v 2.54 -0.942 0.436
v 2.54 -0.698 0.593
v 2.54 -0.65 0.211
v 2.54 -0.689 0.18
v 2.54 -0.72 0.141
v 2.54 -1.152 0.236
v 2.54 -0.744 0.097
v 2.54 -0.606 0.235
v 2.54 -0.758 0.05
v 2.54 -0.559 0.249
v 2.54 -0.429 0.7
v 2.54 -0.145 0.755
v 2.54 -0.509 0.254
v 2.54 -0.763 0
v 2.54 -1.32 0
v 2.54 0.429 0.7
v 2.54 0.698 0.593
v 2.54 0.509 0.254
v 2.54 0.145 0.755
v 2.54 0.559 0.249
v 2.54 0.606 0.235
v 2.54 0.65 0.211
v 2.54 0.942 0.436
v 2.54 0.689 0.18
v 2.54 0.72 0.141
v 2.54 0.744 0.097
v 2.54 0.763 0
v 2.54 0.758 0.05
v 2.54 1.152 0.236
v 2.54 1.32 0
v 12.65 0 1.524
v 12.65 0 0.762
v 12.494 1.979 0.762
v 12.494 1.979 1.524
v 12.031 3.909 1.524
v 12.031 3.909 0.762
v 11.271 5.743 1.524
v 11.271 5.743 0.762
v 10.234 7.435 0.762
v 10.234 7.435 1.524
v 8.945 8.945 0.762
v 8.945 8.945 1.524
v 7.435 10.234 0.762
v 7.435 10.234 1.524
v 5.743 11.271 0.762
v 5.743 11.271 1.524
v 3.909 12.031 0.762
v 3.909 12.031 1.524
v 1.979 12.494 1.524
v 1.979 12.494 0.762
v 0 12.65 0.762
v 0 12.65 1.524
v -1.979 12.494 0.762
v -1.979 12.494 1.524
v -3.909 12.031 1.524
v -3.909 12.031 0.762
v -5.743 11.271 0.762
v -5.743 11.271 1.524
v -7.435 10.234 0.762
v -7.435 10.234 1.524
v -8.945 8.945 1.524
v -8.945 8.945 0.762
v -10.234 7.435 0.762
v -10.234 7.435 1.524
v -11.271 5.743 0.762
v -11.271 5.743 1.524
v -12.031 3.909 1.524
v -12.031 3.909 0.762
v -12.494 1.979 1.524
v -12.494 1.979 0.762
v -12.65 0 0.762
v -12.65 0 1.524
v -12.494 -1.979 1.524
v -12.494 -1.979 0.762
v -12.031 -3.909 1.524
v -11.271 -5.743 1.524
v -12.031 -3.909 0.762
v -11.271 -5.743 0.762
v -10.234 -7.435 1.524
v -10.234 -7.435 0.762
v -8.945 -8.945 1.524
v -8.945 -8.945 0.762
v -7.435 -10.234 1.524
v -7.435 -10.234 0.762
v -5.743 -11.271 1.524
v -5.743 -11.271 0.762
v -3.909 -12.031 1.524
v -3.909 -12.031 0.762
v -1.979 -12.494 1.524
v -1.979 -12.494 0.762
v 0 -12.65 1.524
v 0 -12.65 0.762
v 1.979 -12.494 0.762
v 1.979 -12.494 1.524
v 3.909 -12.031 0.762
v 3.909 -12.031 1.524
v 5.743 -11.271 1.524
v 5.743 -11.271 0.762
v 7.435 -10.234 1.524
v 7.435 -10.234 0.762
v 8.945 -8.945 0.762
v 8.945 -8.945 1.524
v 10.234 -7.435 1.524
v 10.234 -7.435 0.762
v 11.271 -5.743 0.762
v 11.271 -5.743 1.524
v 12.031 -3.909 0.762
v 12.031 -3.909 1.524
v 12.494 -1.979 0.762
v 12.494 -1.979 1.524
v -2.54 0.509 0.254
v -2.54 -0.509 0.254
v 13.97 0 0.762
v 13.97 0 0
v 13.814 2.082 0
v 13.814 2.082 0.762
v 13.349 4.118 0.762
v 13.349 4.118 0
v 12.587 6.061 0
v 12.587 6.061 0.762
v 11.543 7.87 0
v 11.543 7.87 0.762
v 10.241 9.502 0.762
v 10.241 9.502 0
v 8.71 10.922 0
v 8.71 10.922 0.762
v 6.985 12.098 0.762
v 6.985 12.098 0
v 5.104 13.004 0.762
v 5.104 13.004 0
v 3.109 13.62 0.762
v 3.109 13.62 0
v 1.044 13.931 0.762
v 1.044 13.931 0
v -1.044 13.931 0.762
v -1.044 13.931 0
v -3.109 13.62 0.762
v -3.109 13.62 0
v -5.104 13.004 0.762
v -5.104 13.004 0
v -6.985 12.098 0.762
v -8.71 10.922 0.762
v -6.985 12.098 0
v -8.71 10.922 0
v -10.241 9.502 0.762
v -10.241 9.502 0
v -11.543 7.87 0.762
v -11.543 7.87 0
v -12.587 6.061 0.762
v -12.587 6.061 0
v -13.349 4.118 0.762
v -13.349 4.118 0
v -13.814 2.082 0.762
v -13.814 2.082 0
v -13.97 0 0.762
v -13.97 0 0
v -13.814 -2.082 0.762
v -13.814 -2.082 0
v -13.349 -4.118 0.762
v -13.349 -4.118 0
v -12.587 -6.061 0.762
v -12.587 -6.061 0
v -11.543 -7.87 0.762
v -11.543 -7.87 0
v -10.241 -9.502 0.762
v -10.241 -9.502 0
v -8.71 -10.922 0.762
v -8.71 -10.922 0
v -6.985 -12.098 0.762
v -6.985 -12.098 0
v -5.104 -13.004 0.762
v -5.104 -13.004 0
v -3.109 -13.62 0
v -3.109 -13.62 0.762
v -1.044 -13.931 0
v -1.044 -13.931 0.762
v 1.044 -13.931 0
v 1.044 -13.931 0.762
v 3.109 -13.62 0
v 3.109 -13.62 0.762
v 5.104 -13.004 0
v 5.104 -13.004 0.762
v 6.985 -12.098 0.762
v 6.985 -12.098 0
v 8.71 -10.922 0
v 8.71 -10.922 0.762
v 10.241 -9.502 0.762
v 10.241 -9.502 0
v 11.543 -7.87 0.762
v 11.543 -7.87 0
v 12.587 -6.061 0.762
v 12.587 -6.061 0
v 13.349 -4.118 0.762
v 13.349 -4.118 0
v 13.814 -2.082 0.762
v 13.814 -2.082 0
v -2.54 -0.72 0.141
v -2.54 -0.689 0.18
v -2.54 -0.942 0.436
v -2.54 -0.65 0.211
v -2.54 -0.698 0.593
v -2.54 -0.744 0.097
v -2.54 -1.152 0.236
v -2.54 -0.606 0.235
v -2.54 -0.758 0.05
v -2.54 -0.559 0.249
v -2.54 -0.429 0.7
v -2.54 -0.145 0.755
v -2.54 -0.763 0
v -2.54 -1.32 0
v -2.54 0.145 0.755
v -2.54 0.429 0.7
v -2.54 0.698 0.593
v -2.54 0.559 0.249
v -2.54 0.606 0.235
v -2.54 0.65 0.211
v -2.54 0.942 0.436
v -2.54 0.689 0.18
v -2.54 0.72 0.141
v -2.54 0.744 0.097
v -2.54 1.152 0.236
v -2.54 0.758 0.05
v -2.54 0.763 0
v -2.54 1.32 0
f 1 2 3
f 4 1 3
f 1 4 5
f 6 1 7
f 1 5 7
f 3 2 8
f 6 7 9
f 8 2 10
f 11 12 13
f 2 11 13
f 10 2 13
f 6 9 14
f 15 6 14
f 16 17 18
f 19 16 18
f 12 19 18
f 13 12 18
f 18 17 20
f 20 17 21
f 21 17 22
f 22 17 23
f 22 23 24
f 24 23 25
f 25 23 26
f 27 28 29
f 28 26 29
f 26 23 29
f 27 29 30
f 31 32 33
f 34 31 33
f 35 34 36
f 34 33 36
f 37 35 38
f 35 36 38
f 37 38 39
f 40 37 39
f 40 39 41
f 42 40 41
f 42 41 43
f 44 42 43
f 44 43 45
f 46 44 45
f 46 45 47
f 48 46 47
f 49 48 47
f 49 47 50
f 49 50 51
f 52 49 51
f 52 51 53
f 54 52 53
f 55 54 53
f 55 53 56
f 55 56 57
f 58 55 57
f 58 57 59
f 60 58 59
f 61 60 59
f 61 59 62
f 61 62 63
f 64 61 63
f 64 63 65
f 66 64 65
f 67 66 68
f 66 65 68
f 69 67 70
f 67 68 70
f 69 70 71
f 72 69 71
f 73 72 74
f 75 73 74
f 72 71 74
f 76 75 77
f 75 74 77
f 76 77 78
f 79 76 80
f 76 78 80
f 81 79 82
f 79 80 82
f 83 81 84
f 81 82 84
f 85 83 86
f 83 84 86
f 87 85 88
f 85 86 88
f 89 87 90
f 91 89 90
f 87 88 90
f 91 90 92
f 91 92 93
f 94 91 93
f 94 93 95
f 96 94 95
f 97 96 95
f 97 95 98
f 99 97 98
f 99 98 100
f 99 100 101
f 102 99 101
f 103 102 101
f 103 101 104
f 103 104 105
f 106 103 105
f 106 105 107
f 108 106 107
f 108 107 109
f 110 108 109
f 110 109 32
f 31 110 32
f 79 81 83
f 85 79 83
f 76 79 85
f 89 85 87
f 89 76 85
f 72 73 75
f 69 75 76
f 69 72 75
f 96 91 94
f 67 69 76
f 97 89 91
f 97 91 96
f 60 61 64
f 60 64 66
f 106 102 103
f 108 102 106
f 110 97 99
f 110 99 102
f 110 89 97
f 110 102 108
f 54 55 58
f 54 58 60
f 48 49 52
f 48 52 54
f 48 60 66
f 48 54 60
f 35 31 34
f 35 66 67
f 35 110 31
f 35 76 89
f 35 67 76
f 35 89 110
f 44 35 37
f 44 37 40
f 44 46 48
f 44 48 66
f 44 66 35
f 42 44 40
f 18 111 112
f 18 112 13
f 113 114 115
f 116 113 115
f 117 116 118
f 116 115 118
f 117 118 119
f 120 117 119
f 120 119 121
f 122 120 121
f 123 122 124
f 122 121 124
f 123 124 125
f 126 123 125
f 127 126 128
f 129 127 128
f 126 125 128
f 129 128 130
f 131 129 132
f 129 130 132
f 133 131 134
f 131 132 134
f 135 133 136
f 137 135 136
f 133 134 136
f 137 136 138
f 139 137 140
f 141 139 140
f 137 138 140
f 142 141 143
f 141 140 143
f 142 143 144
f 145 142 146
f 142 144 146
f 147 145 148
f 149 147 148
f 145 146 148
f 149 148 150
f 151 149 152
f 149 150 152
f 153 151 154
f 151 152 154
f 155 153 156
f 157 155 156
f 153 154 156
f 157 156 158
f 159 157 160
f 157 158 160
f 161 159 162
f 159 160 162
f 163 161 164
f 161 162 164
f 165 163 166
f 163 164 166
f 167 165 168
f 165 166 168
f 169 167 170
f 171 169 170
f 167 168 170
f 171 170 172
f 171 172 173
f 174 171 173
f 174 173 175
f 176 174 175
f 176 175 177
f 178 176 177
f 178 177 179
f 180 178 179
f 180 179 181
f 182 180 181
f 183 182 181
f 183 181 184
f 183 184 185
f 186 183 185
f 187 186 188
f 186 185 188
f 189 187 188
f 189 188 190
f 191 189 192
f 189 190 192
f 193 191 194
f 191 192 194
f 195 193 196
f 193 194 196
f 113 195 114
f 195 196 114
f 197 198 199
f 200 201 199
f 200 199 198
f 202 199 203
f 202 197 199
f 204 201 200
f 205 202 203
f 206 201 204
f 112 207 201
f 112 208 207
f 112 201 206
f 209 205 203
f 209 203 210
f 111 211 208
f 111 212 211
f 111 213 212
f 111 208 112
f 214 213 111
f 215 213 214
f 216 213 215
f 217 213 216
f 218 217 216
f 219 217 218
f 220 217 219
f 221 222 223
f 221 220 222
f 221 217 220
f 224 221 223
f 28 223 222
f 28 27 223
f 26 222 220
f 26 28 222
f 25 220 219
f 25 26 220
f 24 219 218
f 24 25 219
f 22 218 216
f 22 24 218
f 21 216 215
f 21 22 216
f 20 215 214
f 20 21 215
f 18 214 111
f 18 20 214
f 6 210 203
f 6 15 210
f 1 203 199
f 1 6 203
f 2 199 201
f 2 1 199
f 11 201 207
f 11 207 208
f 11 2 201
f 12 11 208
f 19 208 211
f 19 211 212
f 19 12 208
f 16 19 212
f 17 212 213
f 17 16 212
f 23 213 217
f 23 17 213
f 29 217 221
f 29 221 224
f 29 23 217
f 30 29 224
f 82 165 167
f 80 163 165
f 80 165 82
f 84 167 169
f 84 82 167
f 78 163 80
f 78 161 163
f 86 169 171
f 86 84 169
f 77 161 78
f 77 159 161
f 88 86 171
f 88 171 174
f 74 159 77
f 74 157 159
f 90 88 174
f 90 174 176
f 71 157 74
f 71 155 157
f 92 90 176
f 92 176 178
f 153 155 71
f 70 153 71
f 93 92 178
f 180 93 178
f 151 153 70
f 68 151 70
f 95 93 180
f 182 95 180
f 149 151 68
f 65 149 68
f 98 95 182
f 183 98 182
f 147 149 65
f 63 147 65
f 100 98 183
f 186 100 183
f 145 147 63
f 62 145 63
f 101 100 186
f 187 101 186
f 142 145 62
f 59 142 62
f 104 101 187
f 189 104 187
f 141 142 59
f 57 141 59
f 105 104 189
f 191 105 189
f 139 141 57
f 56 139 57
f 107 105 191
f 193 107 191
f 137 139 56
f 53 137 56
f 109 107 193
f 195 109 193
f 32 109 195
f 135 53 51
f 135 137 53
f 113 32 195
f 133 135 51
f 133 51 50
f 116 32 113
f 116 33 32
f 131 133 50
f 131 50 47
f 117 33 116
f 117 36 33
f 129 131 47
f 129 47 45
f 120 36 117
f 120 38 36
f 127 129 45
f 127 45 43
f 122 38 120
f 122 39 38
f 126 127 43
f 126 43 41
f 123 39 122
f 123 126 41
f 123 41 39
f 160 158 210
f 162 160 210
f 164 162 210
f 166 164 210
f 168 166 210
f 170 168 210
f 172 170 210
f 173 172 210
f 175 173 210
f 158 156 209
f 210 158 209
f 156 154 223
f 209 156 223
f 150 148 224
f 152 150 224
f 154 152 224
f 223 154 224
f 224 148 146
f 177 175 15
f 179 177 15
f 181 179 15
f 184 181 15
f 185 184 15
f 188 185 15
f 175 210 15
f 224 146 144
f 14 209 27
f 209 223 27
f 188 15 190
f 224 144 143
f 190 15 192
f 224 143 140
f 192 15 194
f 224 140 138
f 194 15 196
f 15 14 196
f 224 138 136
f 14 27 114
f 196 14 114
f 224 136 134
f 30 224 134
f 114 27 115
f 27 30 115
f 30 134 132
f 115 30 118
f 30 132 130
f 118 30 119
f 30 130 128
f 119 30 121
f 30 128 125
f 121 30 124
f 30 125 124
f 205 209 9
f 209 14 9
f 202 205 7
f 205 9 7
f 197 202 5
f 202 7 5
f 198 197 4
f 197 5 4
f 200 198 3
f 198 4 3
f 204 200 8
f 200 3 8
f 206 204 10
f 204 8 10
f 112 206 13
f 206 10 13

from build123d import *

# Parameters (mm, degrees)
F0_R     = 12.65
F1_DEPTH = 1.524
F2_R     = 13.97
F3_DEPTH = 0.762
F4_W     = 5.08
F4_H     = 1.524
F6_W     = 5.08000508
F6_H     = 1.5265774739
F7_DEPTH = 0.254
F8_R     = 0.25399


# Not quite as in the source:
# - a fillet or chamfer is up to 0.001 mm smaller than in the source, because OpenCascade refuses the exact size


with BuildPart() as f1:
    # F0 (on Top) → F1 (new body)
    with BuildSketch(Plane.XY):
        Circle(F0_R)
    extrude(amount=F1_DEPTH)

    # F2 (on Top) → F3 (join)
    with BuildSketch(Plane.XY):
        Circle(F2_R)
    extrude(amount=F3_DEPTH)

    # F4 (on Front) → F5 (revolve, cut)
    with BuildSketch(Plane.XZ):
        Rectangle(F4_W, F4_H)
    revolve(axis=Axis((0, 0, -0.762), (-1, 0, 0)), mode=Mode.SUBTRACT)

    # F6 (on Top) → F7 (join)
    with BuildSketch(Plane.XY):
        Rectangle(F6_W, F6_H)
    extrude(amount=F7_DEPTH)

    # F8 (radius 0.254 in the source; OpenCascade refuses exactly that, so slightly less here)
    f8_edges = [f1.edges().sort_by_distance(p)[0] for p in [
        (0, 0.763289, 0.254),
        (0, -0.763289, 0.254),
    ]]
    fillet(f8_edges, radius=F8_R)


solid = f1.part
